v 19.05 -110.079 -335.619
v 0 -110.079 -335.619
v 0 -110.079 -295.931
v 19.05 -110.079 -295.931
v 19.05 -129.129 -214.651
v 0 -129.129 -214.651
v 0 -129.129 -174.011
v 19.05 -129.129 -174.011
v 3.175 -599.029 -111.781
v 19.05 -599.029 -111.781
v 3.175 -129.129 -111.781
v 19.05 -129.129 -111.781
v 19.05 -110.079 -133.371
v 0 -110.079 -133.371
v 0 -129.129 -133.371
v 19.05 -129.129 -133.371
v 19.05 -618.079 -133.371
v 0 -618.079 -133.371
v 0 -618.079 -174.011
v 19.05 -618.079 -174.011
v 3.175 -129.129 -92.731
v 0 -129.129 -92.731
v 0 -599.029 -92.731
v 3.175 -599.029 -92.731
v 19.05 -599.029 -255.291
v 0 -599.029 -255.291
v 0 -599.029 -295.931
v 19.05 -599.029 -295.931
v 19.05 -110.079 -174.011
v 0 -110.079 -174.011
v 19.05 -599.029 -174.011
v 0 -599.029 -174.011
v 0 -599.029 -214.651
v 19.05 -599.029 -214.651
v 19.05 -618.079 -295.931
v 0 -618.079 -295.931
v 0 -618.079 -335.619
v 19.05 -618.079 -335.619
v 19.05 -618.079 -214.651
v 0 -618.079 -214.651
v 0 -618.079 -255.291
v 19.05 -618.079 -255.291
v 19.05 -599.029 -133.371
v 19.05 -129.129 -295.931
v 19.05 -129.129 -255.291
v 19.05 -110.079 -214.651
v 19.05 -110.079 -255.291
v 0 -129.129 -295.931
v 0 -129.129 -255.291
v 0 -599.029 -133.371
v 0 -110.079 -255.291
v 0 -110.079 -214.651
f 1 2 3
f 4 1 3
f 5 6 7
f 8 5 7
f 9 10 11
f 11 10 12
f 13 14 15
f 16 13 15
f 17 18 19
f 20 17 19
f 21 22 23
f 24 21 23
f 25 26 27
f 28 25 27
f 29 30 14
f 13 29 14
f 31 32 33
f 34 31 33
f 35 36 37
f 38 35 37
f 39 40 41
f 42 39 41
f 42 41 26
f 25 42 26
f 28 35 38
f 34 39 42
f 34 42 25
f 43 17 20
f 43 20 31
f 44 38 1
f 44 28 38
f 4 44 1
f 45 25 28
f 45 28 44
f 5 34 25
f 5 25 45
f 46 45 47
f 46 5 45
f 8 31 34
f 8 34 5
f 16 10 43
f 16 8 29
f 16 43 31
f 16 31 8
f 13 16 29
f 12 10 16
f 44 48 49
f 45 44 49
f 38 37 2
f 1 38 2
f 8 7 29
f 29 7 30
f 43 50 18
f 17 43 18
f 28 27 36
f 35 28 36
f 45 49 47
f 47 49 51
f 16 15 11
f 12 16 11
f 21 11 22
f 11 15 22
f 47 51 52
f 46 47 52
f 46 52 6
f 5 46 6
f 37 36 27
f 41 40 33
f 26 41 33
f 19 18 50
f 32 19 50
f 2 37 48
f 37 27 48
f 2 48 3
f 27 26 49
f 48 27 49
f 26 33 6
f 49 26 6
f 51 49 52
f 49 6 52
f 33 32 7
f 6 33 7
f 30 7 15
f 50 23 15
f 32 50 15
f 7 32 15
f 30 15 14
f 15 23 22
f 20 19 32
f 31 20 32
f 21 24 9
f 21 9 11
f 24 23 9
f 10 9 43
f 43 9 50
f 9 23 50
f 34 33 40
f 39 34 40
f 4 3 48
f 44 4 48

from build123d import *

# Parameters (mm, degrees)
F1_DEPTH = 19.05
F2_W     = 469.9
F2_H     = 19.05
F3_DEPTH = 15.875


with BuildPart() as f1:
    # F0 (on Right) → F1 (new body)
    with BuildSketch(Plane.YZ):
        Polygon((-599.02876, -133.371351), (-618.07876, -133.371351), (-618.07876, -174.011351), (-599.02876, -174.011351), (-599.02876, -214.651351), (-618.07876, -214.651351), (-618.07876, -255.291351), (-599.02876, -255.291351), (-599.02876, -295.931351), (-618.07876, -295.931351), (-618.07876, -335.618851), (-599.02876, -335.618851), (-129.12876, -335.618851), (-110.07876, -335.618851), (-110.07876, -295.931351), (-129.12876, -295.931351), (-129.12876, -255.291351), (-110.07876, -255.291351), (-110.07876, -214.651351), (-129.12876, -214.651351), (-129.12876, -174.011351), (-110.07876, -174.011351), (-110.07876, -133.371351), (-129.12876, -133.371351), (-129.12876, -92.731351), (-599.02876, -92.731351), align=None)
    extrude(amount=F1_DEPTH)

    # F2 (on face) → F3 (cut)
    with BuildSketch(Plane.YZ.offset(19.05)):
        with Locations((-364.07876, -102.256351)):
            Rectangle(F2_W, F2_H)
    extrude(amount=-F3_DEPTH, mode=Mode.SUBTRACT)


solid = f1.part
